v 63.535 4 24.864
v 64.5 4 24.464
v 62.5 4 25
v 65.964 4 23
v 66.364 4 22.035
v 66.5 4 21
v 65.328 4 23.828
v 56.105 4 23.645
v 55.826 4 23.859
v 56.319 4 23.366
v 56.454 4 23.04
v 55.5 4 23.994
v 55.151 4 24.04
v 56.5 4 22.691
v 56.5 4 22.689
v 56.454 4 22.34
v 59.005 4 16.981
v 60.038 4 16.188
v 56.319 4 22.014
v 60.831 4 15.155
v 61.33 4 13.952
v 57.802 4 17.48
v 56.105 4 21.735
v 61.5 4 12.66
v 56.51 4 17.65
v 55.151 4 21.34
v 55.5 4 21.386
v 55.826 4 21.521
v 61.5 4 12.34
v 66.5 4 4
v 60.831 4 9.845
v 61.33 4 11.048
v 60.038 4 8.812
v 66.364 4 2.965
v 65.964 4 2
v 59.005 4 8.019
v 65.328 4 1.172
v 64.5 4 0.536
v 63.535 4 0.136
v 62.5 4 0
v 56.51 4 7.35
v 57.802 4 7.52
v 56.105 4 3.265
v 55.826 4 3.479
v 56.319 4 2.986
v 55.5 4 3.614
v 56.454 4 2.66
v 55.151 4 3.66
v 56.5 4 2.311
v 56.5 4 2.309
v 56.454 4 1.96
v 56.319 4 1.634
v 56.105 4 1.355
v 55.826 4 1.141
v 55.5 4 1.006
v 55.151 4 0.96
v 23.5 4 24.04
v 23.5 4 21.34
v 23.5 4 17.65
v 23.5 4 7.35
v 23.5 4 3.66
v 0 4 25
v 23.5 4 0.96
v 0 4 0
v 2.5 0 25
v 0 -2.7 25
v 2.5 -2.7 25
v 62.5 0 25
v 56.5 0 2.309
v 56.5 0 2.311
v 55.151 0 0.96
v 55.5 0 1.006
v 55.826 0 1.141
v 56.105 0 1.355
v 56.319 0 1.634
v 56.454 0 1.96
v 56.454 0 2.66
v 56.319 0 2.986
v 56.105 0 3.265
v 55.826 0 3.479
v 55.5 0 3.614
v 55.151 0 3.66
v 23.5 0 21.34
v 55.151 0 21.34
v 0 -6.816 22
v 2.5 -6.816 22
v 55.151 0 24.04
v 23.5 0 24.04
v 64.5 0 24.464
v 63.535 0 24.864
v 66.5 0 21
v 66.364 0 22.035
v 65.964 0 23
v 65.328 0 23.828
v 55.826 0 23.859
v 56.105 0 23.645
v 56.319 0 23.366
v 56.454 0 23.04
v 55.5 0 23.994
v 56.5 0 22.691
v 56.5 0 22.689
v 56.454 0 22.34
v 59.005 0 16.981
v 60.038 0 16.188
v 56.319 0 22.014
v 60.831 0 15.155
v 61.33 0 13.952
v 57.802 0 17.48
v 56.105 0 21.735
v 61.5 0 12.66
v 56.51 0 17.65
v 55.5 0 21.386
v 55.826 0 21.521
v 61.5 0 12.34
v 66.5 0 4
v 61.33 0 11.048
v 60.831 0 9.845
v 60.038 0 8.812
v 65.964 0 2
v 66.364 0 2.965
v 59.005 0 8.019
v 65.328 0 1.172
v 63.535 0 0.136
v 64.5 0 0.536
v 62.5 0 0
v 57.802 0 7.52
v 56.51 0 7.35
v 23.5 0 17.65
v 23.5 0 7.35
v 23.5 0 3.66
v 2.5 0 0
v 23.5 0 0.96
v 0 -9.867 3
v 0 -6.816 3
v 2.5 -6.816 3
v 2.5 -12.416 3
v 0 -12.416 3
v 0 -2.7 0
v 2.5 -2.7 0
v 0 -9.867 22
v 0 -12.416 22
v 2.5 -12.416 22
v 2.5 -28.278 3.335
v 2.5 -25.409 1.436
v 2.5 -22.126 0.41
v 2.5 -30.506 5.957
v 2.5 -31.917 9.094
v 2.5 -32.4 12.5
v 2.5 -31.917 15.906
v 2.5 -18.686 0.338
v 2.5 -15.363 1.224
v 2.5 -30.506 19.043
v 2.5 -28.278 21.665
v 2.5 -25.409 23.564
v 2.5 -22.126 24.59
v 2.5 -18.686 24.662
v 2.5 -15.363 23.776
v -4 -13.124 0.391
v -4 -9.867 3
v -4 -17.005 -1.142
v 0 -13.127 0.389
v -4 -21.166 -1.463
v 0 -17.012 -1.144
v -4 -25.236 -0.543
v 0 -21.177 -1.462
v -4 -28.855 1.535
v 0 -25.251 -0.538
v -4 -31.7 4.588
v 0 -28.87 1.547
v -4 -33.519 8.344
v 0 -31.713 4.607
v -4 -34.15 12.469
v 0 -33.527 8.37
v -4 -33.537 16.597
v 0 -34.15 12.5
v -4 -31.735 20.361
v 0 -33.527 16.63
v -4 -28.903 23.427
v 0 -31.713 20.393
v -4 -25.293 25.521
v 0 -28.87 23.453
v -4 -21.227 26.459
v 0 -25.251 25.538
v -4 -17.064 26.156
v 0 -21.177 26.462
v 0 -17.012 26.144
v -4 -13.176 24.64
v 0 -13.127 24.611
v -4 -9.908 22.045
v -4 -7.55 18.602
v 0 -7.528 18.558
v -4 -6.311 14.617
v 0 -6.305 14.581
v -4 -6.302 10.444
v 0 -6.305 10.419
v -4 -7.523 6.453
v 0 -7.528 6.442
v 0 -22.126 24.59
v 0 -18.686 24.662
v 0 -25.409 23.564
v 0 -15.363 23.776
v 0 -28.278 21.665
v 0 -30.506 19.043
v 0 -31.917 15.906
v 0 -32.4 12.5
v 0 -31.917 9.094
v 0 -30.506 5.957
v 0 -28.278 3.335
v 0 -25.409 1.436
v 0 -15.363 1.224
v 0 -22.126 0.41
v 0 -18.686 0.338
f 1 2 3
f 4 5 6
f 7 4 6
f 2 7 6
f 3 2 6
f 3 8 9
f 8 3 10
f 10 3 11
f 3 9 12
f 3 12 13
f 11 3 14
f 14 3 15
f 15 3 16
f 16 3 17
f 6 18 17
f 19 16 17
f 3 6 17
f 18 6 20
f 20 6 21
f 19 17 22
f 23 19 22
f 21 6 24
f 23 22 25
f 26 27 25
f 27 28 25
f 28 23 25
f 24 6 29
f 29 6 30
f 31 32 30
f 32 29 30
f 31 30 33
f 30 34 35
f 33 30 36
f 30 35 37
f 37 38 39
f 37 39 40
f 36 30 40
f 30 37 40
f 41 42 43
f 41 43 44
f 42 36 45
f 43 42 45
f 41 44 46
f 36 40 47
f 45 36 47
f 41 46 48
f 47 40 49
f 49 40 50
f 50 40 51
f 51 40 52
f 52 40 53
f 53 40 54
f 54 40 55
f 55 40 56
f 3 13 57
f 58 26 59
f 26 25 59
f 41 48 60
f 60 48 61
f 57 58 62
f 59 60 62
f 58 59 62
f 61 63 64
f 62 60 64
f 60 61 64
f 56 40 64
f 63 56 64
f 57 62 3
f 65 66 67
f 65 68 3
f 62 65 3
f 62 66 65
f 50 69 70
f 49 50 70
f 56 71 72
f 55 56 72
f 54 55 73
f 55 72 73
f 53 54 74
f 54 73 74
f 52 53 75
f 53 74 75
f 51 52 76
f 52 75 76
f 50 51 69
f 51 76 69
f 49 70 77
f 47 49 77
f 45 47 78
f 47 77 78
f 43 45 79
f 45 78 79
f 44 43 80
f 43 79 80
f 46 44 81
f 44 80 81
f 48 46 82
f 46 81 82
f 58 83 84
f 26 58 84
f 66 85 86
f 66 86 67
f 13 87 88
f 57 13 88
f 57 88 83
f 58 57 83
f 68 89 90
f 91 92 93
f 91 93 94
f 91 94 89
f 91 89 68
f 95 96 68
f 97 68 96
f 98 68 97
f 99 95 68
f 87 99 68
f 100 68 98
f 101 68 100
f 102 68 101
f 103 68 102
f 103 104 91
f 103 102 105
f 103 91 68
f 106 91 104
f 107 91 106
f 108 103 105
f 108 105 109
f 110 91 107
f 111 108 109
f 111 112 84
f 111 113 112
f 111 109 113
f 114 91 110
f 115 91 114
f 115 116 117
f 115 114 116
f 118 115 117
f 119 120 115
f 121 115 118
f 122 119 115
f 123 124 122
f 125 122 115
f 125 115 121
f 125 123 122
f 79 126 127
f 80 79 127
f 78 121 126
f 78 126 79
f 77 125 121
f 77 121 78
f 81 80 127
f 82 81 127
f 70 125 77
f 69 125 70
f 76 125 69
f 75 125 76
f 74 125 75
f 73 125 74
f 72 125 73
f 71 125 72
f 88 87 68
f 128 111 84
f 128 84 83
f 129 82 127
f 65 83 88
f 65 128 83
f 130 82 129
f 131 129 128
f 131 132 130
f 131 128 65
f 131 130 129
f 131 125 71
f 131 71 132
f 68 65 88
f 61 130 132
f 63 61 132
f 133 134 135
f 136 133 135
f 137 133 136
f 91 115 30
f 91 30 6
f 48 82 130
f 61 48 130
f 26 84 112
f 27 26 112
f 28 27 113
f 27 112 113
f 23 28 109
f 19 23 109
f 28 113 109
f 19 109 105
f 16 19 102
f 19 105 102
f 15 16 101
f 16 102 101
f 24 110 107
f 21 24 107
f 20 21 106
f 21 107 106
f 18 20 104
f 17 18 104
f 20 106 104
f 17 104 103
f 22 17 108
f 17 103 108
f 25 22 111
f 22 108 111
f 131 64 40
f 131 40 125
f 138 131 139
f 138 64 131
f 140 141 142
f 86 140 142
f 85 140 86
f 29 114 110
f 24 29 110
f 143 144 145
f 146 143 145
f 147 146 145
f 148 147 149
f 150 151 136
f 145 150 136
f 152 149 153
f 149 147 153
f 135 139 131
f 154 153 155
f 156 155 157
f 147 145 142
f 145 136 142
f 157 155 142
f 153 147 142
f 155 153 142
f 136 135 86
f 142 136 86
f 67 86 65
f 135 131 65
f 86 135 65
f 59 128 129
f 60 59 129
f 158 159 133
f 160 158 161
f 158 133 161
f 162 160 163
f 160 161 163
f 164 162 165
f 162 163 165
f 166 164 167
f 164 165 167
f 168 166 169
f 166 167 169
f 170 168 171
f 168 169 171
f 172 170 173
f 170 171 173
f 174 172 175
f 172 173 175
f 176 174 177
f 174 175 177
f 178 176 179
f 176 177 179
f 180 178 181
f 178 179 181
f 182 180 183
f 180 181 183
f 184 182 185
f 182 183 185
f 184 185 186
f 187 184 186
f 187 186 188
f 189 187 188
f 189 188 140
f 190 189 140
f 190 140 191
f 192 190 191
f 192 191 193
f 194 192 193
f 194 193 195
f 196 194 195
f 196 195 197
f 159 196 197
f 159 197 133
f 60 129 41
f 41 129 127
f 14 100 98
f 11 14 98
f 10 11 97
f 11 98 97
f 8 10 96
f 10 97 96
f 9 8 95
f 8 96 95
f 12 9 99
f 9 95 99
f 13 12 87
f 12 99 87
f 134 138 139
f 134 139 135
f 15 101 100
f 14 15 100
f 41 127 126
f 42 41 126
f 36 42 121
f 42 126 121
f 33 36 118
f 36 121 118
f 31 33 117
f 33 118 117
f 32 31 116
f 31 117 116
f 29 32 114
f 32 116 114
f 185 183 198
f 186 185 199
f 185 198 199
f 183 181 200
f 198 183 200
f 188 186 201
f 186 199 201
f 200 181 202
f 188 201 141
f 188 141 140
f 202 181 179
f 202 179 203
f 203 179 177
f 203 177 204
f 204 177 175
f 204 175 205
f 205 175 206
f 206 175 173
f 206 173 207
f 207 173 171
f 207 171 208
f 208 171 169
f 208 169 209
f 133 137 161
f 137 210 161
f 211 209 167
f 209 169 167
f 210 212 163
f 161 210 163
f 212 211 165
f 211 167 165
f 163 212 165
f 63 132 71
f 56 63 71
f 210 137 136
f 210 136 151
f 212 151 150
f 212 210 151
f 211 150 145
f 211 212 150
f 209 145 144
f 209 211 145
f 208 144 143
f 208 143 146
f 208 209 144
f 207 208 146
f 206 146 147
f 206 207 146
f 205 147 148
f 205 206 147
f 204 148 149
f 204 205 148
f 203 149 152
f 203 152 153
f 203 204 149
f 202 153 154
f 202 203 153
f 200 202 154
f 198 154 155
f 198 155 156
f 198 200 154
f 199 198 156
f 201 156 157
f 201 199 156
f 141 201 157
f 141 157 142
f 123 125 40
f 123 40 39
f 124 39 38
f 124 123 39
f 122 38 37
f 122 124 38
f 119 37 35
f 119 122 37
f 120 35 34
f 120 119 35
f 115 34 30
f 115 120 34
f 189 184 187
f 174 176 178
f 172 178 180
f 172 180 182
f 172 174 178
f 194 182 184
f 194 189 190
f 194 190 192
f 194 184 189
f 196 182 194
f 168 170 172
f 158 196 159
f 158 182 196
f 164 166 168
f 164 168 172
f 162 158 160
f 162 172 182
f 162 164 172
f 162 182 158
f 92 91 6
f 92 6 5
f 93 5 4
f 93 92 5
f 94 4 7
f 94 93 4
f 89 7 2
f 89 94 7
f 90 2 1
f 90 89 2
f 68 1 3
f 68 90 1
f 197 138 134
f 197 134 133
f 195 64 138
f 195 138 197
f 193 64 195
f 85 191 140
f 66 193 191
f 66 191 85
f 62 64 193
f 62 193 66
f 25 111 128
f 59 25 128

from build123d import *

# Parameters (mm, degrees)
BOSS_EXTRUDE1_DEPTH = 4
BOSS_EXTRUDE2_DEPTH = 2.5
SKETCH3_R           = 14
BOSS_EXTRUDE3_DEPTH = 4


with BuildPart() as part:
    # Sketch1 → Boss-Extrude1 (new body)
    with BuildSketch(Plane(origin=(0, 0, 0), x_dir=(1, 0, 0), z_dir=(0, 1, 0))):
        with BuildLine():
            Line((0, 0), (62.5, 0))
            ThreePointArc((62.5, 0), (65.328427125, -1.171572875), (66.5, -4))
            Line((66.5, -4), (66.5, -21))
            ThreePointArc((66.5, -21), (65.328427125, -23.828427125), (62.5, -25))
            Line((62.5, -25), (0, -25))
            Line((0, -25), (0, 0))
        make_face()
        with BuildLine():
            Line((23.5, -7.35), (56.51, -7.35))
            ThreePointArc((56.51, -7.35), (60.038462838, -8.811537162), (61.5, -12.34))
            Line((61.5, -12.34), (61.5, -12.66))
            ThreePointArc((61.5, -12.66), (60.038462838, -16.188462838), (56.51, -17.65))
            Line((56.51, -17.65), (23.5, -17.65))
            Line((23.5, -17.65), (23.5, -7.35))
        make_face(mode=Mode.SUBTRACT)
        with BuildLine():
            Line((23.5, -0.96), (55.151, -0.96))
            ThreePointArc((55.151, -0.96), (56.104887048, -1.355112952), (56.5, -2.309))
            Line((56.5, -2.309), (56.5, -2.311))
            ThreePointArc((56.5, -2.311), (56.104887048, -3.264887048), (55.151, -3.66))
            Line((55.151, -3.66), (23.5, -3.66))
            Line((23.5, -3.66), (23.5, -0.96))
        make_face(mode=Mode.SUBTRACT)
        with BuildLine():
            Line((23.5, -21.34), (55.151, -21.34))
            ThreePointArc((55.151, -21.34), (56.104887048, -21.735112952), (56.5, -22.689))
            Line((56.5, -22.689), (56.5, -22.691))
            ThreePointArc((56.5, -22.691), (56.104887048, -23.644887048), (55.151, -24.04))
            Line((55.151, -24.04), (23.5, -24.04))
            Line((23.5, -24.04), (23.5, -21.34))
        make_face(mode=Mode.SUBTRACT)
    extrude(amount=BOSS_EXTRUDE1_DEPTH)

    # Sketch2 → Boss-Extrude2 (add)
    with BuildSketch(Plane.ZY):
        with BuildLine():
            Line((3, -6.816145851), (3, -12.416145851))
            ThreePointArc((3, -12.416145851), (12.5, -32.4), (22, -12.416145851))
            Line((22, -12.416145851), (22, -6.816145851))
            Line((22, -6.816145851), (25, -2.7))
            Line((25, -2.7), (25, 0))
            Line((25, 0), (0, 0))
            Line((0, 0), (0, -2.7))
            Line((0, -2.7), (3, -6.816145851))
        make_face()
    extrude(amount=-BOSS_EXTRUDE2_DEPTH)

    # Sketch3 → Boss-Extrude3 (add)
    with BuildSketch(Plane.ZY):
        with Locations(Location((12.5, -20.15, 0), (0, 0, 132.732110043))):
            Circle(SKETCH3_R)
    extrude(amount=BOSS_EXTRUDE3_DEPTH)


solid = part.part
